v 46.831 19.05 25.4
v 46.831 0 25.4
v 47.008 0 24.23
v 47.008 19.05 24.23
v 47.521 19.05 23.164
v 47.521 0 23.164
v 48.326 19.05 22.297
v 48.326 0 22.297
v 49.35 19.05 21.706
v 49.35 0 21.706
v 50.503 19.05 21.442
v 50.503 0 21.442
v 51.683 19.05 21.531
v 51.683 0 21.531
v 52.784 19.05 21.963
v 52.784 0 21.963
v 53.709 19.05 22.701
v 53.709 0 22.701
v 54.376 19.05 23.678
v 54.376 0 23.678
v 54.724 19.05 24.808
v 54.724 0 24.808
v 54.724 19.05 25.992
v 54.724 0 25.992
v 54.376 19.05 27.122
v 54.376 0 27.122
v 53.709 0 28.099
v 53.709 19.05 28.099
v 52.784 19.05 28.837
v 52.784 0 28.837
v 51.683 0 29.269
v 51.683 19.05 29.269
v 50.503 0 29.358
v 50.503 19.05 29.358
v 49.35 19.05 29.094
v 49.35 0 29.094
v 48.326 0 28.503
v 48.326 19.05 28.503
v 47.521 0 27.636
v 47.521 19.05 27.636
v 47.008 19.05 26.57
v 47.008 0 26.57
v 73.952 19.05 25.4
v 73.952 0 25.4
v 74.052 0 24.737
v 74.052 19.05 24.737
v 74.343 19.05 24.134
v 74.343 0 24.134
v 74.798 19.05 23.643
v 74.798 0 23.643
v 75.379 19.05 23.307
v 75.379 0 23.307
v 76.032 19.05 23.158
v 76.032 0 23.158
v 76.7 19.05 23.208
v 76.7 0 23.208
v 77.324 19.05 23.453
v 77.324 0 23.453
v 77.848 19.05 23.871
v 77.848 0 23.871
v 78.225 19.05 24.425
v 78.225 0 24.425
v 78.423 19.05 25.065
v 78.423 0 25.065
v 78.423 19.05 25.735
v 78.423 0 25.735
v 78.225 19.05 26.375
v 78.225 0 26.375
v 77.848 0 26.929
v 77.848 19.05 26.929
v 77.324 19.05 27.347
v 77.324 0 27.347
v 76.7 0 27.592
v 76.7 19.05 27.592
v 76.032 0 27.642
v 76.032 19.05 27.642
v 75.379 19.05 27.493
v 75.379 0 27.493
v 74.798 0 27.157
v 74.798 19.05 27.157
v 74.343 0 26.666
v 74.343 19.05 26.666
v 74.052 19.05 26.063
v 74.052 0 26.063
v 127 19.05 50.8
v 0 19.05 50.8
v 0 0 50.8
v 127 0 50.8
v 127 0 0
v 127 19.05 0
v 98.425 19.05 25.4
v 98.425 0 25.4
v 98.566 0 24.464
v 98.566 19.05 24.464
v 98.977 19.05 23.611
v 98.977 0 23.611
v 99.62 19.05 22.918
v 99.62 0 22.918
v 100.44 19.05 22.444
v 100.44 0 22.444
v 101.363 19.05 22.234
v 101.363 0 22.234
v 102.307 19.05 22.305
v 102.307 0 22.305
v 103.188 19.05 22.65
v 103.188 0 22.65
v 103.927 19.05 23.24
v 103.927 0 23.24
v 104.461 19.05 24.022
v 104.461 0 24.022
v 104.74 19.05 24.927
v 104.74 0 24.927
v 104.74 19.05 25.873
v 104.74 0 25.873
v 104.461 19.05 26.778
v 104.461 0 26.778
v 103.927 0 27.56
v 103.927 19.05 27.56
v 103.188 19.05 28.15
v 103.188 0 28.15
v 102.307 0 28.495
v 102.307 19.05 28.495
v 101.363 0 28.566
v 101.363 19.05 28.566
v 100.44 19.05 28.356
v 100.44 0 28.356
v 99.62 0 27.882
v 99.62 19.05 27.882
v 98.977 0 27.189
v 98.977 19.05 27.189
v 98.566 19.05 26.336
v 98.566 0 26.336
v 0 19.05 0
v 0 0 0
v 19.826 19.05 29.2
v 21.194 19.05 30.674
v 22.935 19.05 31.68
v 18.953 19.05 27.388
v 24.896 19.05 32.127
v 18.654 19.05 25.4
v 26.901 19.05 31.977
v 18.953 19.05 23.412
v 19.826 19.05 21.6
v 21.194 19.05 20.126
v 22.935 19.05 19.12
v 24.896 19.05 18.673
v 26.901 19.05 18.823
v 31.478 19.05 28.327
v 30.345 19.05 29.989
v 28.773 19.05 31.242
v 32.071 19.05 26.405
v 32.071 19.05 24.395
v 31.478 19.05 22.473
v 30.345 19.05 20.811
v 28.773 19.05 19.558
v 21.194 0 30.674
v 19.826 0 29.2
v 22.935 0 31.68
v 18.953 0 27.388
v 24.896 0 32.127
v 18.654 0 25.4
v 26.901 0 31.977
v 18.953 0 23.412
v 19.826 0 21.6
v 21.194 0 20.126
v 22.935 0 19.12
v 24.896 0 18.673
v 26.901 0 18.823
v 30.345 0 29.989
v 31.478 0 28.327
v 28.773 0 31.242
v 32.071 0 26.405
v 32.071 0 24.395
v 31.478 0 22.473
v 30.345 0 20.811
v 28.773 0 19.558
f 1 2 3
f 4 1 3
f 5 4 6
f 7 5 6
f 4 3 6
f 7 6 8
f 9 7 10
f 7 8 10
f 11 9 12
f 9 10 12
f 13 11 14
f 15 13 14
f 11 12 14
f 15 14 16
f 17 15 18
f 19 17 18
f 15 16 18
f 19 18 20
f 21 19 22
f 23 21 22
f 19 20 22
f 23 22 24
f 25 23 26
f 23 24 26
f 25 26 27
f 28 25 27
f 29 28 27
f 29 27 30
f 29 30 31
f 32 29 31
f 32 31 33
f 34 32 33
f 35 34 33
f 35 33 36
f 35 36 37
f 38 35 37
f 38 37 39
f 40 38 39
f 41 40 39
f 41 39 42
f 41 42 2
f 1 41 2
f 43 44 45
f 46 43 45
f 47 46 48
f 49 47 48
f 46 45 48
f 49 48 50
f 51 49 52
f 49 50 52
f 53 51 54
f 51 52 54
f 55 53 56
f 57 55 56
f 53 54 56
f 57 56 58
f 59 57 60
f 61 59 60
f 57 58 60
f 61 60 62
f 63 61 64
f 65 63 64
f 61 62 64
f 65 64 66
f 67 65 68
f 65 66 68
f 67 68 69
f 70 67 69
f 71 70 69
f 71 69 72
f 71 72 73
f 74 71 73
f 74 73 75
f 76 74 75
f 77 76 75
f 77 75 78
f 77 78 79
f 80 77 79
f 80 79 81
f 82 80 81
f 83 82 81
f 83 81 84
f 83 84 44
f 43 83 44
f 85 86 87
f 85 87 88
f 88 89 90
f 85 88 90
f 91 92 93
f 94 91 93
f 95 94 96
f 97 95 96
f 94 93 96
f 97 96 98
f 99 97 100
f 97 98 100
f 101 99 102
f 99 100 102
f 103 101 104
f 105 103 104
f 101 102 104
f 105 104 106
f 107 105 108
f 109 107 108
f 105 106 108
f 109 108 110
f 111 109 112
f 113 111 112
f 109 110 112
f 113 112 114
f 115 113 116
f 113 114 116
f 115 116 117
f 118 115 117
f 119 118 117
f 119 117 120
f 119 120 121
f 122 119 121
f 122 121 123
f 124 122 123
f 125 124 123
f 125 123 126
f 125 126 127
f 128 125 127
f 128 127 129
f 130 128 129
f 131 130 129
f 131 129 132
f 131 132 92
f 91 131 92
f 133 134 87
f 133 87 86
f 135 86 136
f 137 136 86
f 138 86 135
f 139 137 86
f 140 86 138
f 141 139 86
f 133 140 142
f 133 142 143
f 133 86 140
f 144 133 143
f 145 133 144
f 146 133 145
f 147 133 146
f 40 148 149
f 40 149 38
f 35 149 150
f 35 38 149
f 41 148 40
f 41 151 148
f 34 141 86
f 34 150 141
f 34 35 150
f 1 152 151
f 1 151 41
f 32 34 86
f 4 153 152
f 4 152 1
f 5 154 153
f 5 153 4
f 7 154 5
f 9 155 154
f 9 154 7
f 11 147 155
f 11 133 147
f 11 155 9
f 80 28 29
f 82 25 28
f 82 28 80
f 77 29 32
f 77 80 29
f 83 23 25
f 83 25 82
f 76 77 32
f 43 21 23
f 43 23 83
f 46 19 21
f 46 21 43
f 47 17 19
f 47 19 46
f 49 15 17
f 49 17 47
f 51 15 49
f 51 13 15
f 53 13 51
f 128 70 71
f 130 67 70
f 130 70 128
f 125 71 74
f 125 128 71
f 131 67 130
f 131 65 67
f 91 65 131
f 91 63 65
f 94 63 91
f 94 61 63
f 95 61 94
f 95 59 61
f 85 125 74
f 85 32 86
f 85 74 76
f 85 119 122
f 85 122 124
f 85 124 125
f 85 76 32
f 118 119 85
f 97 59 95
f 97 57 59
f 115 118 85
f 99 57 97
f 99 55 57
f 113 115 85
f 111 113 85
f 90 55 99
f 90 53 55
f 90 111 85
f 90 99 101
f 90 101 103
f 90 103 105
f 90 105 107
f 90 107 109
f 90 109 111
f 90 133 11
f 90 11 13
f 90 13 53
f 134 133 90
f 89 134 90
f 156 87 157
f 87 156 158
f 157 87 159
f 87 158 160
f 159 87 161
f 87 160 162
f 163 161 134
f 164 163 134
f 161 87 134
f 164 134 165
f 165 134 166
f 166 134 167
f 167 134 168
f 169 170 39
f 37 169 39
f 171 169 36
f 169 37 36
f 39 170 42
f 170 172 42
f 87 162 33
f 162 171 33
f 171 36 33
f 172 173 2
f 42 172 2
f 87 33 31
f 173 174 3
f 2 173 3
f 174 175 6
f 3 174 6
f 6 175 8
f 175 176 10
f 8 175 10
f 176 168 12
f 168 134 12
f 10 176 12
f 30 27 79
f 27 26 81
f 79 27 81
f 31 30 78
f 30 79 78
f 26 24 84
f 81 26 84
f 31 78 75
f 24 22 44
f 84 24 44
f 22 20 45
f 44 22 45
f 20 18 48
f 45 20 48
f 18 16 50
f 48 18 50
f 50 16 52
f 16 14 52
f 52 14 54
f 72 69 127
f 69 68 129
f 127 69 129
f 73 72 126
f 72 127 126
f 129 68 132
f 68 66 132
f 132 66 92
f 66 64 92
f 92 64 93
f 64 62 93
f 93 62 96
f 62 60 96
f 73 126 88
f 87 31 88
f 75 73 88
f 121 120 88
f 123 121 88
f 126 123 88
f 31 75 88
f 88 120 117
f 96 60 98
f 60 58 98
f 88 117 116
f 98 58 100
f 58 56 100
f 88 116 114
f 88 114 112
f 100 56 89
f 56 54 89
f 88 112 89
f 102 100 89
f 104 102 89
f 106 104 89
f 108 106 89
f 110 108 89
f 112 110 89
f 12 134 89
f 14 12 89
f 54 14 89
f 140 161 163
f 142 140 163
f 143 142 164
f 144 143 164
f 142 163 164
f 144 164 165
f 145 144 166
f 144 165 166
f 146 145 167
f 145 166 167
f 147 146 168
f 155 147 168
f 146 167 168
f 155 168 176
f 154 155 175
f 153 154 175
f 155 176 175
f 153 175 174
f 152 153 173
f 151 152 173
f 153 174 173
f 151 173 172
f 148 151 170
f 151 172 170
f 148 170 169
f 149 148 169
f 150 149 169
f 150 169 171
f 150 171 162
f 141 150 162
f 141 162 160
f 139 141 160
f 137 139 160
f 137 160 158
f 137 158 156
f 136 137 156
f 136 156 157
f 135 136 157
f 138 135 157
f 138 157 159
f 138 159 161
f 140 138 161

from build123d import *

# Parameters (mm, degrees)
SKETCH1_W                   = 127
SKETCH1_H                   = 19.05
BOSS_EXTRUDE1_DEPTH         = 50.8
F_1_2_CLEARANCE_HOLE1_D     = 13.49248
F_3_8_16_TAPPED_HOLE1_D     = 7.9375
F_12_24_TAPPED_HOLE1_D      = 4.4958
F_1_4_0_25_DIAMETER_HOLE1_D = 6.35


with BuildPart() as part:
    # Sketch1 → Boss-Extrude1 (new body)
    with BuildSketch(Plane.XY):
        with Locations((63.5, 9.525)):
            Rectangle(SKETCH1_W, SKETCH1_H)
    extrude(amount=BOSS_EXTRUDE1_DEPTH)

    # 1/2 Clearance Hole1 (through all)
    with Locations(Plane(origin=(0, 19.05, 0), x_dir=(1, 0, 0), z_dir=(0, 1, 0))):
        with Locations((25.4, -25.4)):
            Hole(F_1_2_CLEARANCE_HOLE1_D / 2)

    # 3/8-16 Tapped Hole1 (through all)
    with Locations(Plane(origin=(0, 19.05, 0), x_dir=(1, 0, 0), z_dir=(0, 1, 0))):
        with Locations((50.8, -25.4)):
            Hole(F_3_8_16_TAPPED_HOLE1_D / 2)

    # #12-24 Tapped Hole1 (through all)
    with Locations(Plane(origin=(0, 19.05, 0), x_dir=(1, 0, 0), z_dir=(0, 1, 0))):
        with Locations((76.2, -25.4)):
            Hole(F_12_24_TAPPED_HOLE1_D / 2)

    # 1/4 (0.25) Diameter Hole1 (through all)
    with Locations(Plane(origin=(0, 19.05, 0), x_dir=(1, 0, 0), z_dir=(0, 1, 0))):
        with Locations((101.6, -25.4)):
            Hole(F_1_4_0_25_DIAMETER_HOLE1_D / 2)


solid = part.part
